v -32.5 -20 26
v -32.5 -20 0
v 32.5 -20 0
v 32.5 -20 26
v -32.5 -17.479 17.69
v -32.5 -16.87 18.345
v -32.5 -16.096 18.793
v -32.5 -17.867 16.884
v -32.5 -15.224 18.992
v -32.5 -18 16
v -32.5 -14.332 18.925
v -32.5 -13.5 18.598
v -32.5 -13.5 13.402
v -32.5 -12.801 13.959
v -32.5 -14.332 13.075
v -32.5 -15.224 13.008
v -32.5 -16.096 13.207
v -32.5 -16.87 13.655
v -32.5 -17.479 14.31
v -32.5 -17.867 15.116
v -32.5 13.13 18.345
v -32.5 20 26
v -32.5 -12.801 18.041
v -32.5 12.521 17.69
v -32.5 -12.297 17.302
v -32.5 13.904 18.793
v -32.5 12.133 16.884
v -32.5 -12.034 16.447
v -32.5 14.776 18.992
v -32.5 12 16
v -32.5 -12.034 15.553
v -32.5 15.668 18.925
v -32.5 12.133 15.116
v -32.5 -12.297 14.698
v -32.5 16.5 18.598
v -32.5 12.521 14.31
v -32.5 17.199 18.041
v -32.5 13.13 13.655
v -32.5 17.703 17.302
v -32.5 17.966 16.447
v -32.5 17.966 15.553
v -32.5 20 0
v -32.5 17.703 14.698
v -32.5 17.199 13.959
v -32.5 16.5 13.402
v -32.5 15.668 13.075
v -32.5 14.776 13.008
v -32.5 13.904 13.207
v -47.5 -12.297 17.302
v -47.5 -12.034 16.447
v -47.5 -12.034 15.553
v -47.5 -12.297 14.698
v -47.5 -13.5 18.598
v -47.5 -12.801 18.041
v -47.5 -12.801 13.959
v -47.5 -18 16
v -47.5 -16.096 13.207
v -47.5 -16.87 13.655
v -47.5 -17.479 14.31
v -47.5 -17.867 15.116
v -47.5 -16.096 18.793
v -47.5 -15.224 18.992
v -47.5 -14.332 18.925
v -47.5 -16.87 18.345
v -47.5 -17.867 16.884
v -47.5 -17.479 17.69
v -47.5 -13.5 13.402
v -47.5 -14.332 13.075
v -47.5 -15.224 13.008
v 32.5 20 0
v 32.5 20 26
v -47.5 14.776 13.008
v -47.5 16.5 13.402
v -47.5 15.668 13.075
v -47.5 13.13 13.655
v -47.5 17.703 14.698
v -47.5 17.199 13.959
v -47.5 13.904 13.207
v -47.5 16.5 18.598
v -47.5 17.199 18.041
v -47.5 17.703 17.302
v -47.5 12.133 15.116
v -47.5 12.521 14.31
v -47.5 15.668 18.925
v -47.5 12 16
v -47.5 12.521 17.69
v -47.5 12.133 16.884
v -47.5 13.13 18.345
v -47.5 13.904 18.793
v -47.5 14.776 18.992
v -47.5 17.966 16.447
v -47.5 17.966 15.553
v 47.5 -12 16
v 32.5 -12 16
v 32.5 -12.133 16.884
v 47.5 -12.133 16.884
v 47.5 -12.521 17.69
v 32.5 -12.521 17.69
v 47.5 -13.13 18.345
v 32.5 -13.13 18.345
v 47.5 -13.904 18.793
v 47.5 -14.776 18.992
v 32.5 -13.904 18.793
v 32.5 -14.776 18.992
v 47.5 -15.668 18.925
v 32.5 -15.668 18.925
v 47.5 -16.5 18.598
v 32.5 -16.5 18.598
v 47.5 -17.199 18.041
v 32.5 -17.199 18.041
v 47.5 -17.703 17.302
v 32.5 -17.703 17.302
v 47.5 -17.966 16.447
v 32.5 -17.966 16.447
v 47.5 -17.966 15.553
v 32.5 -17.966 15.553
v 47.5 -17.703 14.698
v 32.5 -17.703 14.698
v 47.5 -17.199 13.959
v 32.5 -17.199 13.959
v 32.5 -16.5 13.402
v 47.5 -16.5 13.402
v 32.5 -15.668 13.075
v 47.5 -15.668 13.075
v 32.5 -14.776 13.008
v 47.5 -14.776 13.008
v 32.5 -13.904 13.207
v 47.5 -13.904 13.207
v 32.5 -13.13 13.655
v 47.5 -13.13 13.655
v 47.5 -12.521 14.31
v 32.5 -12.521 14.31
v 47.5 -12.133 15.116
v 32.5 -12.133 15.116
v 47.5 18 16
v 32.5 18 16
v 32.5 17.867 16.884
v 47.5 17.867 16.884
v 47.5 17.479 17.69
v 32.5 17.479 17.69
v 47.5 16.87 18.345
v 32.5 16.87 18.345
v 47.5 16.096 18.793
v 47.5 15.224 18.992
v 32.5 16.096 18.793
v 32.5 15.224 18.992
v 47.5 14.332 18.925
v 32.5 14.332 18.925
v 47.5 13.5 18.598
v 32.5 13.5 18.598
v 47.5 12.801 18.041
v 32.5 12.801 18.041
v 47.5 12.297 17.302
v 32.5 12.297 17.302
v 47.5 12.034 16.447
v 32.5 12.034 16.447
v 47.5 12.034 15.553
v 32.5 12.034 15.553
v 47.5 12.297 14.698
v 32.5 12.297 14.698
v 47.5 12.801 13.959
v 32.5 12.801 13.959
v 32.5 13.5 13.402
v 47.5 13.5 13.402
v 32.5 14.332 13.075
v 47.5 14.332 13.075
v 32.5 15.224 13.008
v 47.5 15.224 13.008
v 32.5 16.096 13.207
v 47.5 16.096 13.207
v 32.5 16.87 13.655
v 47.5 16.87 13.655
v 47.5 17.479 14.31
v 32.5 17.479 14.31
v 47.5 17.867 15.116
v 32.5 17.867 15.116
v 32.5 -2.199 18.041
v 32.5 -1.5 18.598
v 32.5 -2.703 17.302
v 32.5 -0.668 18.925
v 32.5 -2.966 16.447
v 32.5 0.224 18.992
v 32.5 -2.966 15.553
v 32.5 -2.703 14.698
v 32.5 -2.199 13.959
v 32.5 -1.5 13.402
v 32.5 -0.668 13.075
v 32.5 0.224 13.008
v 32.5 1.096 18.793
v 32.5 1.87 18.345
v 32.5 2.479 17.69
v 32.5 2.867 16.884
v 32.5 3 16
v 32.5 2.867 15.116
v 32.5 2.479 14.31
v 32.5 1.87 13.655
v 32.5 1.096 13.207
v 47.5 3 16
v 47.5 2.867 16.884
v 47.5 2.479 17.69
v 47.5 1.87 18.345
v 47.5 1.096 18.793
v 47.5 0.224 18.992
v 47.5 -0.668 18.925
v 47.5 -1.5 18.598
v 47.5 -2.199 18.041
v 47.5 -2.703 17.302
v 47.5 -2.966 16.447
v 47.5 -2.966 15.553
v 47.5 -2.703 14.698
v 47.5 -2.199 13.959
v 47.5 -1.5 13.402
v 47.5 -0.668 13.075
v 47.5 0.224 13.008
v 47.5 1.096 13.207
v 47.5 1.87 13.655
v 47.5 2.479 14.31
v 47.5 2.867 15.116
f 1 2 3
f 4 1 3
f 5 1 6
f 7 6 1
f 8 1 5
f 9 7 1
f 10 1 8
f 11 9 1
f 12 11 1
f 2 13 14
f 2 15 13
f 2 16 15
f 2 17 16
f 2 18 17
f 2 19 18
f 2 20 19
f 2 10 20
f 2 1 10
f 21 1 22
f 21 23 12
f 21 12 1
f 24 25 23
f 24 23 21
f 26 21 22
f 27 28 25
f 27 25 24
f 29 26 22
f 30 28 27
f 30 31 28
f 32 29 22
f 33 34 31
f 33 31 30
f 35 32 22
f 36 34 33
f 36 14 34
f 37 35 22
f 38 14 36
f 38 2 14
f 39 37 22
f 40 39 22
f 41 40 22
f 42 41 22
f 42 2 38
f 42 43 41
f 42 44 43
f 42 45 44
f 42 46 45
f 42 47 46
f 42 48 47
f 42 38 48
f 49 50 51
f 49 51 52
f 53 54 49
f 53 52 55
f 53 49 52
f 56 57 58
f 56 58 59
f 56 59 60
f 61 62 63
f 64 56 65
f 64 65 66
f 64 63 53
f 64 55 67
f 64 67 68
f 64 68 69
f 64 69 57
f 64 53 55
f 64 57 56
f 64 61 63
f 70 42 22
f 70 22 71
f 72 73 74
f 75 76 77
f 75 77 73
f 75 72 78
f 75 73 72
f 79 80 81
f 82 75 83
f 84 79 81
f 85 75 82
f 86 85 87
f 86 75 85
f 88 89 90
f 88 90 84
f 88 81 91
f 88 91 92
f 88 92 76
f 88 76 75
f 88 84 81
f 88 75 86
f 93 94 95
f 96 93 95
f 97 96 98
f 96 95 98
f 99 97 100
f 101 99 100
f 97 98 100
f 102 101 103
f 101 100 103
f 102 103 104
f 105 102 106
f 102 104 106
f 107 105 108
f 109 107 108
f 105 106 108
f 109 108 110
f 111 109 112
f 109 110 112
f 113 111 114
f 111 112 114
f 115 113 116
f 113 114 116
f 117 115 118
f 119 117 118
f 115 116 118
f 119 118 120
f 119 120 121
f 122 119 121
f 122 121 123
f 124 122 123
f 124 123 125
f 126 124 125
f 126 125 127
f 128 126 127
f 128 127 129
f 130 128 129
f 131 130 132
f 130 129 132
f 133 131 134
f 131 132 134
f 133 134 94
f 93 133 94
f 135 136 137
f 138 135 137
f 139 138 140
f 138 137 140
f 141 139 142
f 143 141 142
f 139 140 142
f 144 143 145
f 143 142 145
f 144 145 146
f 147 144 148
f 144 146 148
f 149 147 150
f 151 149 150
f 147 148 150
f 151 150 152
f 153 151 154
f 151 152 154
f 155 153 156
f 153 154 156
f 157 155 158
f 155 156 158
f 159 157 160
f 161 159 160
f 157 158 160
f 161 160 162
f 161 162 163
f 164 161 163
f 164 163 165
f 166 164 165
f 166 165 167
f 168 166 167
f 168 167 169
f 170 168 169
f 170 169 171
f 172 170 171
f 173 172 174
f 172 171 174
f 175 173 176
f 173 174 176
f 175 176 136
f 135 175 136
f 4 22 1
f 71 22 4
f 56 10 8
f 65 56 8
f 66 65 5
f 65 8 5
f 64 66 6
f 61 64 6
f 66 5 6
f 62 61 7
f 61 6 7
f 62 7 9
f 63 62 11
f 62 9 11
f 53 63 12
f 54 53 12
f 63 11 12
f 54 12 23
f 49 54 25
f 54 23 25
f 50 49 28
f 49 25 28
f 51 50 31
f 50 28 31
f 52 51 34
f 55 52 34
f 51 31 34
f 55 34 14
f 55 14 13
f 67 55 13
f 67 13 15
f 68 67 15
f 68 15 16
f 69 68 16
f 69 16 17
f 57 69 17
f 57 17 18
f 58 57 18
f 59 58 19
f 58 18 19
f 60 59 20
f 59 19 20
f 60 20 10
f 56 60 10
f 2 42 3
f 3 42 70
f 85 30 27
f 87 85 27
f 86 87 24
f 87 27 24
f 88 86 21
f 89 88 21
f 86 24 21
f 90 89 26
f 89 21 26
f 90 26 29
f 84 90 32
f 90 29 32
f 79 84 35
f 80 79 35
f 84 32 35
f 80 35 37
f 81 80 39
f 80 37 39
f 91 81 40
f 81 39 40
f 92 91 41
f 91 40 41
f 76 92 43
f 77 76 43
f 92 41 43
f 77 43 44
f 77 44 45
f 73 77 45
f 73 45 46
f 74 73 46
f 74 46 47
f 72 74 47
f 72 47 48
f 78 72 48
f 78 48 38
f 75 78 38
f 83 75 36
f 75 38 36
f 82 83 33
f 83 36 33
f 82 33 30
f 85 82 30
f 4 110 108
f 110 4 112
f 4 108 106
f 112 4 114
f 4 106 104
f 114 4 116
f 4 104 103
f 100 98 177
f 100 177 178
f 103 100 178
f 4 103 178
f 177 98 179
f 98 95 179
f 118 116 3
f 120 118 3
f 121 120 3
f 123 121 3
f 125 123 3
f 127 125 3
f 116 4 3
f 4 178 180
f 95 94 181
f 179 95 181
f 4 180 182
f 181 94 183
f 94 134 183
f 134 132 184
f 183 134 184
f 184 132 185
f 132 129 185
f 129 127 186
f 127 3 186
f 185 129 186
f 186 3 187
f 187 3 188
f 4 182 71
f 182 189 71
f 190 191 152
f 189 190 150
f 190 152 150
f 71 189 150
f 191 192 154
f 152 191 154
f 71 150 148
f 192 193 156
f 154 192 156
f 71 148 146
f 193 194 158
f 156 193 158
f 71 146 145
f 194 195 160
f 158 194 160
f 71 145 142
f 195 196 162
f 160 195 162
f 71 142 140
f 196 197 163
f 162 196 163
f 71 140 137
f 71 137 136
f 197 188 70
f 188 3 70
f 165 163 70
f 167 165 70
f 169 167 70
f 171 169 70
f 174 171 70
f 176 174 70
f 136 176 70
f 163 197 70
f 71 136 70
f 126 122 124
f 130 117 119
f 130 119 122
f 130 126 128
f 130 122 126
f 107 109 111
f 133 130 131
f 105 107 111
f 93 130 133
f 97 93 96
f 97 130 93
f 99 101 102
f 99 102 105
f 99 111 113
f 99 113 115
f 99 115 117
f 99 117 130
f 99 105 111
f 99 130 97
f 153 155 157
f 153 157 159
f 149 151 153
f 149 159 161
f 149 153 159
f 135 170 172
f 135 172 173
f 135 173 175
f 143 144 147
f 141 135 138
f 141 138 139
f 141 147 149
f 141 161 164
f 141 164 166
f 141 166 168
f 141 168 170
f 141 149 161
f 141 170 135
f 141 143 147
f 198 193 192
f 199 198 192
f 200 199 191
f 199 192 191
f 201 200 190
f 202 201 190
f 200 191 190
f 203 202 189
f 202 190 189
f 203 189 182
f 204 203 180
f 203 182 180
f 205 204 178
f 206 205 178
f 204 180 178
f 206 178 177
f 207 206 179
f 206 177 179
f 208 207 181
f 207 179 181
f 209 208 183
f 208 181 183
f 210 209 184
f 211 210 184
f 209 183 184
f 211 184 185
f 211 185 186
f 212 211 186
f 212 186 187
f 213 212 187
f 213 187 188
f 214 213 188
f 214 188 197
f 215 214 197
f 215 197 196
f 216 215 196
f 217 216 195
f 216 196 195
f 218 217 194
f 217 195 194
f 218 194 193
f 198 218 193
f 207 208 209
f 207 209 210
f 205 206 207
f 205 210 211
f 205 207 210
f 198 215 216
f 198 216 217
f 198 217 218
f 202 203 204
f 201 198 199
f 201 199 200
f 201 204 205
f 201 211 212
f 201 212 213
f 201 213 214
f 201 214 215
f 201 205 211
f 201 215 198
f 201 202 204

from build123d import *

# Parameters (mm, degrees)
F0_W     = 65
F0_H     = 40
F1_DEPTH = 26
F2_R     = 3
F3_DEPTH = 15
F4_R     = 3
F5_DEPTH = 15


with BuildPart() as f1:
    # F0 (on Top) → F1 (new body)
    with BuildSketch(Plane.XY):
        Rectangle(F0_W, F0_H)
    extrude(amount=F1_DEPTH)

    # F2 (on face) → F3 (join)
    with BuildSketch(Plane.YZ.offset(32.5)):
        with Locations((0, 16)):
            Circle(F2_R)
        with Locations((-15, 16)):
            Circle(F2_R)
        with Locations((15, 16)):
            Circle(F2_R)
    extrude(amount=F3_DEPTH)

    # F4 (on face) → F5 (join)
    with BuildSketch(Plane(origin=(-32.5, 0, 0), x_dir=(0, -1, 0), z_dir=(-1, 0, 0))):
        with Locations((15, 16)):
            Circle(F4_R)
        with Locations((-15, 16)):
            Circle(F4_R)
    extrude(amount=F5_DEPTH)


solid = f1.part
